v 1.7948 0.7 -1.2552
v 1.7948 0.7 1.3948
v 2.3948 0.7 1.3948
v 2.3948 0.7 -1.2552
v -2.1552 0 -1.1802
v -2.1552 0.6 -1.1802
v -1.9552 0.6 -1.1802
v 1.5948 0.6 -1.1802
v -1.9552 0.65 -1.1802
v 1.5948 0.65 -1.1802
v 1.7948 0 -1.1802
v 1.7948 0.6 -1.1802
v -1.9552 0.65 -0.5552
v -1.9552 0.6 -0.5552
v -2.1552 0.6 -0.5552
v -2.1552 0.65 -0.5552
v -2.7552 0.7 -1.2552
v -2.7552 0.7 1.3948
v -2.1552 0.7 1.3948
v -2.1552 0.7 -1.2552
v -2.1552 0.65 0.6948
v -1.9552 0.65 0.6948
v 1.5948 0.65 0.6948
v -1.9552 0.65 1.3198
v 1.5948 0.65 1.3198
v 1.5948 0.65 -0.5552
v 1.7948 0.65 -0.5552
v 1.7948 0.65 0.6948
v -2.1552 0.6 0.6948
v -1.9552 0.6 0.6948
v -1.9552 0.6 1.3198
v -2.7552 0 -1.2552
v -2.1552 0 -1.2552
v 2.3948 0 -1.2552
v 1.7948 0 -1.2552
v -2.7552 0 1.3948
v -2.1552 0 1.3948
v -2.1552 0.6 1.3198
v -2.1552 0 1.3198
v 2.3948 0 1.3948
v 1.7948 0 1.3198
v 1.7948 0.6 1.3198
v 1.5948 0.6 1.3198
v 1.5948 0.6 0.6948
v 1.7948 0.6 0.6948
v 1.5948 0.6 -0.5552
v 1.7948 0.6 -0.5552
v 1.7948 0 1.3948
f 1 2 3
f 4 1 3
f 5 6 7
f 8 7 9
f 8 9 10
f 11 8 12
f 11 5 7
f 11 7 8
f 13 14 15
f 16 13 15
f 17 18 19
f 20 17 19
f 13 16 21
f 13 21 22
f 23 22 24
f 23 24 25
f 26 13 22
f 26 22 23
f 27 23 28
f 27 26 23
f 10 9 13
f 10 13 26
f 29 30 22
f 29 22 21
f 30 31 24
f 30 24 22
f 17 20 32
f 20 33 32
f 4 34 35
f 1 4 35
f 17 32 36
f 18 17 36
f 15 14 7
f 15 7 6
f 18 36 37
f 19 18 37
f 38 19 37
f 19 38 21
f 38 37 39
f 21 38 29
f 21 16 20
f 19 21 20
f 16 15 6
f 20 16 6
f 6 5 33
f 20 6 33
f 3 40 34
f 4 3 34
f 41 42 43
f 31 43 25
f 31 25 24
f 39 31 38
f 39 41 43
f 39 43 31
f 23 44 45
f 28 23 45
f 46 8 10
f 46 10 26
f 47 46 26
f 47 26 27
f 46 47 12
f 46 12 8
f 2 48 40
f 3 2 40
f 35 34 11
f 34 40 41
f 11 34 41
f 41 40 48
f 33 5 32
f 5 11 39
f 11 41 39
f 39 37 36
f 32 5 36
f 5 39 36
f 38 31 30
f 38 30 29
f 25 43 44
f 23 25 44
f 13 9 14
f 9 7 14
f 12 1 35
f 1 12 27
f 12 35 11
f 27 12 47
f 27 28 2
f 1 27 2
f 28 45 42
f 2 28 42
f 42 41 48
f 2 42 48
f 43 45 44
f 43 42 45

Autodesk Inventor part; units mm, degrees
ref_plane "YZ Plane" through (0, 0, 0) normal (1, 0, 0) x (0, 1, 0)
ref_plane "XZ Plane" through (0, 0, 0) normal (0, 1, 0) x (-1, 0, 0)
ref_plane "XY Plane" through (0, 0, 0) normal (0, 0, 1) x (1, 0, 0)
sketch "Sketch1" plane through (0, 0, 0) normal (0, 1, 0) x (-1, 0, 0)
  line L0 (-2.3198, 1.3198) -> (2.6802, 1.3198)
  line L1 (2.6802, 1.3198) -> (2.6802, -1.1802)
  line L2 (2.6802, -1.1802) -> (-2.3198, -1.1802)
  line L3 (-2.3198, -1.1802) -> (-2.3198, 1.3198)
  point P0 (0, 0)
  dimension "d0" = 5
  dimension "d1" = 2.5
extrude "Extrusion1" add sketch "Sketch1" along normal blind 0.6
sketch "Sketch2" plane through (0, 0, 0) normal (0, -1, 0) x (1, 0, 0)
  line L0 (-2.6802, -1.1802) -> (2.3198, -1.1802) projected
  line L1 (2.3198, -1.1802) -> (2.3198, 1.3198) projected
  line L2 (-2.7552, 1.3948) -> (-2.1552, 1.3948)
  line L3 (-2.1552, 1.3948) -> (-2.1552, -1.2552)
  line L4 (-2.1552, -1.2552) -> (-2.7552, -1.2552)
  line L5 (-2.7552, -1.2552) -> (-2.7552, 1.3948)
  line L6 (2.3948, -1.2552) -> (1.7948, -1.2552)
  line L7 (1.7948, -1.2552) -> (1.7948, 1.3948)
  line L8 (1.7948, 1.3948) -> (2.3948, 1.3948)
  line L9 (2.3948, 1.3948) -> (2.3948, -1.2552)
  point P0 (0, 0)
  dimension "d4" = 0.6
  dimension "d5" = 0.6
  dimension "d6" = 5.15
  dimension "d7" = 0.075
  dimension "d8" = 2.65
  dimension "d9" = 2.65
  dimension "d11" = 0.075
  dimension "d12" = 0.075
extrude "Extrusion2" add sketch "Sketch2" against normal blind 0.7
sketch "Sketch3" plane through (0, 0.6, 0) normal (0, 1, 0) x (1, 0, 0)
  line L0 (1.7948, -1.3198) -> (1.7948, 1.1802) projected
  line L1 (1.7948, 1.1802) -> (-2.1552, 1.1802) projected
  line L2 (-2.1552, 1.1802) -> (1.7948, 1.1802)
  line L3 (1.7948, 1.1802) -> (1.7948, -1.3198)
  line L4 (1.7948, -1.3198) -> (-2.1552, -1.3198)
  line L5 (-2.1552, -1.3198) -> (-2.1552, 1.1802)
  line L6 (-2.1552, 1.1802) -> (-1.9552, 1.1802)
  line L7 (-1.9552, 1.1802) -> (-1.9552, 0.5552)
  line L8 (-1.9552, 0.5552) -> (-2.1552, 0.5552)
  line L9 (-2.1552, 0.5552) -> (-2.1552, 1.1802)
  line L10 (-2.1552, -1.3198) -> (-1.9552, -1.3198)
  line L11 (-1.9552, -1.3198) -> (-1.9552, -0.6948)
  line L12 (-1.9552, -0.6948) -> (-2.1552, -0.6948)
  line L13 (-2.1552, -0.6948) -> (-2.1552, -1.3198)
  line L14 (1.7948, 1.1802) -> (1.5948, 1.1802)
  line L15 (1.5948, 1.1802) -> (1.5948, 0.5552)
  line L16 (1.5948, 0.5552) -> (1.7948, 0.5552)
  line L17 (1.7948, 0.5552) -> (1.7948, 1.1802)
  line L18 (1.7948, -1.3198) -> (1.5948, -1.3198)
  line L19 (1.5948, -1.3198) -> (1.5948, -0.6948)
  line L20 (1.5948, -0.6948) -> (1.7948, -0.6948)
  line L21 (1.7948, -0.6948) -> (1.7948, -1.3198)
  point P0 (0, 0)
  dimension "d15" = 0.2
  dimension "d16" = 0.2
  dimension "d17" = 0.2
  dimension "d18" = 0.2
  dimension "d19" = 0.625
  dimension "d20" = 0.625
  dimension "d21" = 0.625
  dimension "d22" = 0.625
extrude "Extrusion3" add sketch "Sketch3" along normal blind 0.05 contours L20 L19 L4 L11 L12 L5 L8 L7 L1 L15 L16 L0
properties part number "2020Resistor"
